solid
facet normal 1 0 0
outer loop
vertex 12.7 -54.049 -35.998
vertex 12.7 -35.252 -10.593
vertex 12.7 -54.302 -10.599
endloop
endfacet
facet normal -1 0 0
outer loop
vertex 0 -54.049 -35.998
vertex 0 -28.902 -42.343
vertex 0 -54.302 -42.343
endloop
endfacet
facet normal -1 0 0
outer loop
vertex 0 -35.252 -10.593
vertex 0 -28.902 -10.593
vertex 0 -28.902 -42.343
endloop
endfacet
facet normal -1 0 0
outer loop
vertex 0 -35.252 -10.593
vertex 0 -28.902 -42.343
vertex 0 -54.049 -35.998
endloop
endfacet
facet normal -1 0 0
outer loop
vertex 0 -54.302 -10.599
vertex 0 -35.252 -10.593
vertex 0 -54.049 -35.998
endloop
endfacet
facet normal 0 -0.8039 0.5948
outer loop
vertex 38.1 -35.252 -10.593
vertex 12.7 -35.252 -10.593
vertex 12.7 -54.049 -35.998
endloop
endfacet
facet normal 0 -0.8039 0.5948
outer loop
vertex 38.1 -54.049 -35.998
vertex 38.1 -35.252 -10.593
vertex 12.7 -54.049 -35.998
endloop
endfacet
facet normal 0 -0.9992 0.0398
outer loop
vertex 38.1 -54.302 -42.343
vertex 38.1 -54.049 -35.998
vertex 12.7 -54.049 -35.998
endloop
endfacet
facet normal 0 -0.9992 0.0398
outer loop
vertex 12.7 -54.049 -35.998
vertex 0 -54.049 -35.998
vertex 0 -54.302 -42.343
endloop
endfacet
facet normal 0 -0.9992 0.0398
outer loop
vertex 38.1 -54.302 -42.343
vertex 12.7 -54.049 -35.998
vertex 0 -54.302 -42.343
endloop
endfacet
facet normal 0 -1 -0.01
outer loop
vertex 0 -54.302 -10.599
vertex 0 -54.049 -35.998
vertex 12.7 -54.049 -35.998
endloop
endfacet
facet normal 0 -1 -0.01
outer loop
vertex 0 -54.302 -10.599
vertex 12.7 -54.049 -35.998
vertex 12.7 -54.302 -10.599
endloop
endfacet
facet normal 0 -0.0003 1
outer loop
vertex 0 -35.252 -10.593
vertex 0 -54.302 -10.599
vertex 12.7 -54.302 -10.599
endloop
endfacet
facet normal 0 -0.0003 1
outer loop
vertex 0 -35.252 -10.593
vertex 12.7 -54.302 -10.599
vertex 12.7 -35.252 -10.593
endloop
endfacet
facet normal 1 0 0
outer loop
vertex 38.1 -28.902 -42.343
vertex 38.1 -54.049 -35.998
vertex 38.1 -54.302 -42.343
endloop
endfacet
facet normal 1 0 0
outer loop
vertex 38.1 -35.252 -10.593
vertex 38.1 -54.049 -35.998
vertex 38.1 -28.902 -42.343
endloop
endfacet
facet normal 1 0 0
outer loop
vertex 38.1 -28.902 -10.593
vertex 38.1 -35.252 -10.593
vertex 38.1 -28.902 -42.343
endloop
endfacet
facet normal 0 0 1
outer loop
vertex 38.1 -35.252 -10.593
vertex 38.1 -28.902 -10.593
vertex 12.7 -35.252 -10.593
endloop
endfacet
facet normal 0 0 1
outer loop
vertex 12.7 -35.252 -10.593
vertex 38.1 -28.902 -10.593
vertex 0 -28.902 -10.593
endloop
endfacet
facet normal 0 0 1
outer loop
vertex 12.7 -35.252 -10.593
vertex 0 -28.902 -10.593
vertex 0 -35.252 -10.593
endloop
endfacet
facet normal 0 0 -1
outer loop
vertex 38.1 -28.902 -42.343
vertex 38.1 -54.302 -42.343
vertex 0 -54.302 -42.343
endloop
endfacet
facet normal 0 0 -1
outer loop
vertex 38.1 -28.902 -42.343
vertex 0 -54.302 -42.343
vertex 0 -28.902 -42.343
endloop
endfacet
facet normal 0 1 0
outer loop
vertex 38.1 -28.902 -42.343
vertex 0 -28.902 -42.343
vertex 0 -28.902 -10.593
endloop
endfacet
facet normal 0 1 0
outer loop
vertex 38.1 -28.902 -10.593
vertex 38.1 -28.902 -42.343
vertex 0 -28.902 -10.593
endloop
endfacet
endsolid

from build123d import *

# Parameters (mm, degrees)
F1_DEPTH = 38.1
F3_DEPTH = 12.7


with BuildPart() as f1:
    # F0 (on Right) → F1 (new body)
    with BuildSketch(Plane.YZ):
        Polygon((-54.048603, -35.997721), (-54.302403, -42.342647), (-28.902403, -42.342647), (-28.902403, -10.592647), (-35.252403, -10.592647), align=None)
    extrude(amount=F1_DEPTH)

    # F2 (on face) → F3 (join)
    with BuildSketch(Plane(origin=(0, 0, 0), x_dir=(0, -1, 0), z_dir=(-1, 0, 0))):
        Polygon((54.302402, -10.598989), (35.252403, -10.592647), (54.048603, -35.997721), align=None)
    extrude(amount=-F3_DEPTH)


solid = f1.part
